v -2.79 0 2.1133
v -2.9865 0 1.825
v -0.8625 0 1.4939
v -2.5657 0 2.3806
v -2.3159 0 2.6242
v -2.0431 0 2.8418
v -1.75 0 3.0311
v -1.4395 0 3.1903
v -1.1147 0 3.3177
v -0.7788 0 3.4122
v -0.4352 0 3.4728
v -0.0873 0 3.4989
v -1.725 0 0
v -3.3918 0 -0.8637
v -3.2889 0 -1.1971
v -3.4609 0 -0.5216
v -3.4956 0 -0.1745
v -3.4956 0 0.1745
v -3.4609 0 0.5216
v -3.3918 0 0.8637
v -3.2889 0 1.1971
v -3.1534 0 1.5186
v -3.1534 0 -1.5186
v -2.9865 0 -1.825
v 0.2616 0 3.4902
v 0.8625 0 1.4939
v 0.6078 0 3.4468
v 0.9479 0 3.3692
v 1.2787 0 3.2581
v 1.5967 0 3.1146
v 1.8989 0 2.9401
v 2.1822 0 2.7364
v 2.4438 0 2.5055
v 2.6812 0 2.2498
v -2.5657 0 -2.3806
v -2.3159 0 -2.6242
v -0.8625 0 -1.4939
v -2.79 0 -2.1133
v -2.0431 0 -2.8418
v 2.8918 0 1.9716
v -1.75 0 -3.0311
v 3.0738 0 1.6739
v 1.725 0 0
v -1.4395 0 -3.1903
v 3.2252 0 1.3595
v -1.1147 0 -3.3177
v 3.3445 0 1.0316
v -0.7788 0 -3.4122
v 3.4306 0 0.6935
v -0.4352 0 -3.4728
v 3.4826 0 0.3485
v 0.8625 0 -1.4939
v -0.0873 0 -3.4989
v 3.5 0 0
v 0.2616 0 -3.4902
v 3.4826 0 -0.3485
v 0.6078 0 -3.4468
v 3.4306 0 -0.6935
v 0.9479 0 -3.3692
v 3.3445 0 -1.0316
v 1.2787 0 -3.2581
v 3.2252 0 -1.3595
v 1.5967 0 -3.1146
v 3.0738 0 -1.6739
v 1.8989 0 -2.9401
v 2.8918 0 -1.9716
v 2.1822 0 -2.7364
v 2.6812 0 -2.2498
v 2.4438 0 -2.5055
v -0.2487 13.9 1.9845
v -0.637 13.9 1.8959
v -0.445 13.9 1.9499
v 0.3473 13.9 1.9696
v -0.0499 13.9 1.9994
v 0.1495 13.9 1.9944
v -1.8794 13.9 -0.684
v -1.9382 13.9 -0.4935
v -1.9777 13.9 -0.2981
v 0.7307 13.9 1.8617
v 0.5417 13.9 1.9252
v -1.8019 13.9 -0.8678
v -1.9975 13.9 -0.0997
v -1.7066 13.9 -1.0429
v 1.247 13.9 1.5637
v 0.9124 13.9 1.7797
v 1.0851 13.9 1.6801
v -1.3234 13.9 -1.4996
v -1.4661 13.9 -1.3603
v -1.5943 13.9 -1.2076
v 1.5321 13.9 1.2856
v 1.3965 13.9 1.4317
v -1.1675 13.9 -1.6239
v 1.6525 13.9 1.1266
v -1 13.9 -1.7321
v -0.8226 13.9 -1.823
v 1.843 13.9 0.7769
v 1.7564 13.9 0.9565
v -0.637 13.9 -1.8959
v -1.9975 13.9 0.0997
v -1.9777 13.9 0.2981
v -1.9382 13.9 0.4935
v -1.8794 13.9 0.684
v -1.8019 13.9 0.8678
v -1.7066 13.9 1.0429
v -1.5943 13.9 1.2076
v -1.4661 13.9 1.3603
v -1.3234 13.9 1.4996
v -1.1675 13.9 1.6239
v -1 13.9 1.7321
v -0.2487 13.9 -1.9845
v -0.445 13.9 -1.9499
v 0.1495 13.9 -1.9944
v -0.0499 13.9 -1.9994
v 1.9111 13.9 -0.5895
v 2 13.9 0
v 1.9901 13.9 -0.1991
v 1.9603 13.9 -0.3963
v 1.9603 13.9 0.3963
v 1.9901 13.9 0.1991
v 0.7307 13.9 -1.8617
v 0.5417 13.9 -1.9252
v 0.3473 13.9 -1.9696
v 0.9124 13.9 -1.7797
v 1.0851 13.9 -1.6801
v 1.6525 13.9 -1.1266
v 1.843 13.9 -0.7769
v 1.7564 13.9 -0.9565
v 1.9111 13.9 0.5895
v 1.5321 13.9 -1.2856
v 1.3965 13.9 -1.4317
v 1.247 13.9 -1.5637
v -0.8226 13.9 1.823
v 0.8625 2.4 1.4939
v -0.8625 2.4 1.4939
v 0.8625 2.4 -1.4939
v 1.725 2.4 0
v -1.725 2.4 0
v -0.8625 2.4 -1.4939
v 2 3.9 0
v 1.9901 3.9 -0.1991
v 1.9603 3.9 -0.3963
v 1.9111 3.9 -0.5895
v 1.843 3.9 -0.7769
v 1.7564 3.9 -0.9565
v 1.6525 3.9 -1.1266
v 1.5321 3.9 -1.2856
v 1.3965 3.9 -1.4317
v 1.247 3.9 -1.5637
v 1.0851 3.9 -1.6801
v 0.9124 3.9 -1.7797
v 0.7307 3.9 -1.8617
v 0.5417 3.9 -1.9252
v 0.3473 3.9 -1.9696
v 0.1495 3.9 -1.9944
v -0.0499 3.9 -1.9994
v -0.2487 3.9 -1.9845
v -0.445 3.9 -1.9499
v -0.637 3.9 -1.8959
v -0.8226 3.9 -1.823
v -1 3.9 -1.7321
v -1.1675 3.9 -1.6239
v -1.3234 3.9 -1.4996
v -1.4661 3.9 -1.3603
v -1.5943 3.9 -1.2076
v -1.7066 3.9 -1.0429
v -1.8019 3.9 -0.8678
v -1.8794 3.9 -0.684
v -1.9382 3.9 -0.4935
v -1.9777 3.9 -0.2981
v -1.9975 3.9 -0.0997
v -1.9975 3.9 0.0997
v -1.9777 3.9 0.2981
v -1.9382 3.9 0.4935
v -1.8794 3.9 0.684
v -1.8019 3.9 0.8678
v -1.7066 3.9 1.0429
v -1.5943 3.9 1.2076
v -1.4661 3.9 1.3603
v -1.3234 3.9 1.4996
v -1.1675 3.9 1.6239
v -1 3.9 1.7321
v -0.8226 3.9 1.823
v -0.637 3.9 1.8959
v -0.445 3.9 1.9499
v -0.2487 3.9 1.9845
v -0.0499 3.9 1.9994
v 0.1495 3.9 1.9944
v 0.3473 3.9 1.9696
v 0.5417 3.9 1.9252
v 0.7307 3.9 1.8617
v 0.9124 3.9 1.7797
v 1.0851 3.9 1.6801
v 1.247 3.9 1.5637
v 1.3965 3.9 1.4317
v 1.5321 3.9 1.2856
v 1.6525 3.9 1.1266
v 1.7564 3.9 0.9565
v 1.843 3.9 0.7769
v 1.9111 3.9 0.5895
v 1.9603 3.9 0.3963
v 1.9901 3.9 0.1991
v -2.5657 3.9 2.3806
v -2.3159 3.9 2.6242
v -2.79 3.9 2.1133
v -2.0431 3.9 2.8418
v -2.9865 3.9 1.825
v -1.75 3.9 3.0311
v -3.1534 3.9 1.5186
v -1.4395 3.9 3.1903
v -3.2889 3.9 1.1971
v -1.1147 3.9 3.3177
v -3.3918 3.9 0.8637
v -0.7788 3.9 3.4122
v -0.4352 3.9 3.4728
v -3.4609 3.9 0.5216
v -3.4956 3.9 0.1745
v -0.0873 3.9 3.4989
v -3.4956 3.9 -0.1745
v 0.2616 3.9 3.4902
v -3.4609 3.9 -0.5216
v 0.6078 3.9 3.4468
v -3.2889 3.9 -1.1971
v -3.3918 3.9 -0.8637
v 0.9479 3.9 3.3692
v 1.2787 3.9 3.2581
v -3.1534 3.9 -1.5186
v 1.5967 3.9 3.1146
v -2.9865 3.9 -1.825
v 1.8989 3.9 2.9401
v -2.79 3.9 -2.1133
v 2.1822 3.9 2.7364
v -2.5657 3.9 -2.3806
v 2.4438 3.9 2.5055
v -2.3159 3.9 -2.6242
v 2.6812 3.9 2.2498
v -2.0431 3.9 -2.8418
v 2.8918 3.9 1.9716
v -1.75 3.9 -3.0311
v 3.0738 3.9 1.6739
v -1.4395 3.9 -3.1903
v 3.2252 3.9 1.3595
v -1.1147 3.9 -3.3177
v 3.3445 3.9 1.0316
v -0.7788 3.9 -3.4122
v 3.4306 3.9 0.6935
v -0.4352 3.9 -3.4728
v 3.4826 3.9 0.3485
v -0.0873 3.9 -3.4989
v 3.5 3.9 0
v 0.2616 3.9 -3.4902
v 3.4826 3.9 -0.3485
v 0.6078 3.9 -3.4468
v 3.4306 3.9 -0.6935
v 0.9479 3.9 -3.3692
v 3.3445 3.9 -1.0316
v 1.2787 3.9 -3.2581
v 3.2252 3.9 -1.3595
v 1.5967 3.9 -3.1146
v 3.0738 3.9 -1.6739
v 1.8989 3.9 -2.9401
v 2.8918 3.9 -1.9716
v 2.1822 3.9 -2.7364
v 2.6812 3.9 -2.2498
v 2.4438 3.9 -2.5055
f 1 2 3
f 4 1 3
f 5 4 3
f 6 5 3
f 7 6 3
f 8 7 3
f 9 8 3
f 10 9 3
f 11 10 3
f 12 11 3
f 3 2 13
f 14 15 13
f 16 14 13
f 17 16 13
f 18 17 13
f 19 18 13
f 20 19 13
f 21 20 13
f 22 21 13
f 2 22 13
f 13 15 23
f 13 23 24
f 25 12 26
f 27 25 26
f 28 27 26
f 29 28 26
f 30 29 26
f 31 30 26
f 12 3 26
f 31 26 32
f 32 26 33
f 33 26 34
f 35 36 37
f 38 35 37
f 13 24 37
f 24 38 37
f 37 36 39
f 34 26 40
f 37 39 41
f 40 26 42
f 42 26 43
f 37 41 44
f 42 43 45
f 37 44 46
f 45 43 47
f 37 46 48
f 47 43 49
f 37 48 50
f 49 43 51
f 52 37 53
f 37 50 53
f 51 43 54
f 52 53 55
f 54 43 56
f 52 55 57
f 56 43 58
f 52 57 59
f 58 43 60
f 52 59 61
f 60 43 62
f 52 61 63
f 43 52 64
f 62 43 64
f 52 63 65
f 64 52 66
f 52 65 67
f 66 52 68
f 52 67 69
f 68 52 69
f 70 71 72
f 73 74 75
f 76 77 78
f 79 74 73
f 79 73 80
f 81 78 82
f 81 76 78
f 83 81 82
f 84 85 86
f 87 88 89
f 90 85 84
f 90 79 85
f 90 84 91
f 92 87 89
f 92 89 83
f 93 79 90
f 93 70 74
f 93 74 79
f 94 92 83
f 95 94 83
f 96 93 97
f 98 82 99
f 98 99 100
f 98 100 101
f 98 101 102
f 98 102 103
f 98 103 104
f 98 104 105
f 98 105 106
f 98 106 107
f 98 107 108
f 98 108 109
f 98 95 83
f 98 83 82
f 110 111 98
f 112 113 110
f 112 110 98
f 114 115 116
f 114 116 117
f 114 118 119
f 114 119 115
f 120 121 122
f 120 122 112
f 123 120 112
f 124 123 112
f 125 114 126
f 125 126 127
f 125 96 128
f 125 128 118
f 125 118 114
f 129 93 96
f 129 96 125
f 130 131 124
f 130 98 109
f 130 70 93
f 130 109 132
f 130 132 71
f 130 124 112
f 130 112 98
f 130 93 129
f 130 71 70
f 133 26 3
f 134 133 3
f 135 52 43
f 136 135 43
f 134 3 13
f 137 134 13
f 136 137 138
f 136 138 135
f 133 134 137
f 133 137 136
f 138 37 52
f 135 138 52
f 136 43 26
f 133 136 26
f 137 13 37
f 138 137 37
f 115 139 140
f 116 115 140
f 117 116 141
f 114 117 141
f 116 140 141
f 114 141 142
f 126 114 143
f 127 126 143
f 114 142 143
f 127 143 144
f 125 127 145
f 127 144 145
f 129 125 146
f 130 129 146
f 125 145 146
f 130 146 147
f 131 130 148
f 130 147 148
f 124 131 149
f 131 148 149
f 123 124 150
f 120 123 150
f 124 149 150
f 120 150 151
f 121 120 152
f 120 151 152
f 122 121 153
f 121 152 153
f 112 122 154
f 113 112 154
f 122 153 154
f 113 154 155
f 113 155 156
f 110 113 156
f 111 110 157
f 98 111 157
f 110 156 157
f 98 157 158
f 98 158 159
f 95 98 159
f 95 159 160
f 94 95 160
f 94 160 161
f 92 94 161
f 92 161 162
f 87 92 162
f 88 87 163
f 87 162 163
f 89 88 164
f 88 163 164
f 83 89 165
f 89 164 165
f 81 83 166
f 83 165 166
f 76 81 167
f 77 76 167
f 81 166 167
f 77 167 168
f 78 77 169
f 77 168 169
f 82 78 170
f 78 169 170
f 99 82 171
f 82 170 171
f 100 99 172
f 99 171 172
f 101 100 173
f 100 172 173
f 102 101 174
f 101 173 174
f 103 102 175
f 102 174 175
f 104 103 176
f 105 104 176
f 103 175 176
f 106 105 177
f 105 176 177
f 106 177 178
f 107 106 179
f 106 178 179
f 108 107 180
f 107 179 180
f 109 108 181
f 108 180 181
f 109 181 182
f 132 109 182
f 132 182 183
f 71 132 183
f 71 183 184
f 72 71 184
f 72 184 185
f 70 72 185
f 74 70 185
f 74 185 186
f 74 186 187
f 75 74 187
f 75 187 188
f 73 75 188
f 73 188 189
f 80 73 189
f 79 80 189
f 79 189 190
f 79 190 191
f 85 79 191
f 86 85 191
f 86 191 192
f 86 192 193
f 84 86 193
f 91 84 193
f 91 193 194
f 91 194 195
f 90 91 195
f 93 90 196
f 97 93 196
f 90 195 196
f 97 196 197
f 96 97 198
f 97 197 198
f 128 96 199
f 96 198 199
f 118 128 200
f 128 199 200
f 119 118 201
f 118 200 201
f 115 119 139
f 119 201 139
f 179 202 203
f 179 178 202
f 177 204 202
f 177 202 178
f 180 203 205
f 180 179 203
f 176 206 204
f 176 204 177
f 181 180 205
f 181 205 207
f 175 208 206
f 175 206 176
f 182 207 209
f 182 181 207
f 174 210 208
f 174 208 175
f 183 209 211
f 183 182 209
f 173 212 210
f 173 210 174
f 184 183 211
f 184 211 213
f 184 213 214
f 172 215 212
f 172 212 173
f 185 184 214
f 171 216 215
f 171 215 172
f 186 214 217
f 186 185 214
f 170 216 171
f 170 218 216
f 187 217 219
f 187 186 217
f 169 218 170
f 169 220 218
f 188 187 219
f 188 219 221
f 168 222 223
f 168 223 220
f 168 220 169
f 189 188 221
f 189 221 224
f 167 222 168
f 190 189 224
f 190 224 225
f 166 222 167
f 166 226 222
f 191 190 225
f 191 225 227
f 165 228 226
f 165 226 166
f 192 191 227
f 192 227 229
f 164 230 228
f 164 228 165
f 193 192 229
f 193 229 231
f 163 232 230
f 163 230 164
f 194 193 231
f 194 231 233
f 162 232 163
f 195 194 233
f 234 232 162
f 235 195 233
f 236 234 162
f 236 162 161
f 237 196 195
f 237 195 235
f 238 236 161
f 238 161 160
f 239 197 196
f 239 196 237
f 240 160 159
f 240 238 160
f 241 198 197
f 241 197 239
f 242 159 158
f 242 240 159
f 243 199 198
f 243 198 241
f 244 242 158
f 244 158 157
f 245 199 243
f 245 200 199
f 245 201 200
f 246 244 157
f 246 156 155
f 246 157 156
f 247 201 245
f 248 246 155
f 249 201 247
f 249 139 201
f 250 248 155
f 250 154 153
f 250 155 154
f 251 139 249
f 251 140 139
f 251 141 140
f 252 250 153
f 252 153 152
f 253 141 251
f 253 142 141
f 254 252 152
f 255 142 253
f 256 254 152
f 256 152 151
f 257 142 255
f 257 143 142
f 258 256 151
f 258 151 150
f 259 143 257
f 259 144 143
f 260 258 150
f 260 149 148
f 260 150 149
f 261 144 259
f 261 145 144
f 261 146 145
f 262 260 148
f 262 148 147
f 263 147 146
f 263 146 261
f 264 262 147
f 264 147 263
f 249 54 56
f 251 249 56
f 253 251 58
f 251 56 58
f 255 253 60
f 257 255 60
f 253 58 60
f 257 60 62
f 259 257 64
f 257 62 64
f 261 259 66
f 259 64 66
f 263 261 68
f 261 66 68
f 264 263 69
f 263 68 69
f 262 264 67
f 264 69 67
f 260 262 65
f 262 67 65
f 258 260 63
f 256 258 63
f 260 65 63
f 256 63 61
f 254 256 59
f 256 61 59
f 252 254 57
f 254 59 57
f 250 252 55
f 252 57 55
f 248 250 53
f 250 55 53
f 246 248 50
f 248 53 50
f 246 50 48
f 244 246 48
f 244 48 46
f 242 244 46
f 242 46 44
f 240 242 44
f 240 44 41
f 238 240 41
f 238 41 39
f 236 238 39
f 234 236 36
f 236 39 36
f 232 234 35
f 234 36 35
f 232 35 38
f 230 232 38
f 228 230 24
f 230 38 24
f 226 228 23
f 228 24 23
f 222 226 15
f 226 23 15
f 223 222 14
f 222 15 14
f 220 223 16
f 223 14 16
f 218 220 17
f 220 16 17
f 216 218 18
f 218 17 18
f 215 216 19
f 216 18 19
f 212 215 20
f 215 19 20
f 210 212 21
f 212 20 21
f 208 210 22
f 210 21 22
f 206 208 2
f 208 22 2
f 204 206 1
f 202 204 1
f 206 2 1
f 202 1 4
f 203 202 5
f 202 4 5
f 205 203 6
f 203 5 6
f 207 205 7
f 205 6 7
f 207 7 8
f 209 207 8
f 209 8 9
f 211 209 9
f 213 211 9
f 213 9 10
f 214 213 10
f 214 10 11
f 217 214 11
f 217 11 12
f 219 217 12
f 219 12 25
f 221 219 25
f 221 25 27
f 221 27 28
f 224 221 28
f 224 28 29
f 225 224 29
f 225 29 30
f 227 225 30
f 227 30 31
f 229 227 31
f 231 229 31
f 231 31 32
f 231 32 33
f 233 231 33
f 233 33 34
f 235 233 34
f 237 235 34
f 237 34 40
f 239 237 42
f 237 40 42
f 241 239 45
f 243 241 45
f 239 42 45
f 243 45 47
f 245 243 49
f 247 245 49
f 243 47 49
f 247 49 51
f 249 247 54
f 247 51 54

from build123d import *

# Parameters (mm, degrees)
SKETCH_1_R          = 3.5
EXTRUDE_1_DEPTH     = 3.9
SKETCH_2_R          = 2
EXTRUDE_2_DEPTH     = 10
CUT_EXTRUDE_1_DEPTH = 2.4


with BuildPart() as part:
    # 草图1 → 凸台-拉伸1 (new body)
    with BuildSketch(Plane(origin=(0, 0, 0), x_dir=(1, 0, 0), z_dir=(0, 1, 0))):
        Circle(SKETCH_1_R)
    extrude(amount=EXTRUDE_1_DEPTH)

    # 草图2 → 凸台-拉伸2 (add)
    with BuildSketch(Plane(origin=(0, 3.9, 0), x_dir=(1, 0, 0), z_dir=(0, 1, 0))):
        Circle(SKETCH_2_R)
    extrude(amount=EXTRUDE_2_DEPTH)

    # 草图3 → 切除-拉伸1 (cut)
    with BuildSketch(Plane.XZ):
        Polygon((1.725, 0), (0.8625, 1.493893822), (-0.8625, 1.493893822), (-1.725, 0), (-0.8625, -1.493893822), (0.8625, -1.493893822), align=None)
    extrude(amount=-CUT_EXTRUDE_1_DEPTH, mode=Mode.SUBTRACT)


solid = part.part
